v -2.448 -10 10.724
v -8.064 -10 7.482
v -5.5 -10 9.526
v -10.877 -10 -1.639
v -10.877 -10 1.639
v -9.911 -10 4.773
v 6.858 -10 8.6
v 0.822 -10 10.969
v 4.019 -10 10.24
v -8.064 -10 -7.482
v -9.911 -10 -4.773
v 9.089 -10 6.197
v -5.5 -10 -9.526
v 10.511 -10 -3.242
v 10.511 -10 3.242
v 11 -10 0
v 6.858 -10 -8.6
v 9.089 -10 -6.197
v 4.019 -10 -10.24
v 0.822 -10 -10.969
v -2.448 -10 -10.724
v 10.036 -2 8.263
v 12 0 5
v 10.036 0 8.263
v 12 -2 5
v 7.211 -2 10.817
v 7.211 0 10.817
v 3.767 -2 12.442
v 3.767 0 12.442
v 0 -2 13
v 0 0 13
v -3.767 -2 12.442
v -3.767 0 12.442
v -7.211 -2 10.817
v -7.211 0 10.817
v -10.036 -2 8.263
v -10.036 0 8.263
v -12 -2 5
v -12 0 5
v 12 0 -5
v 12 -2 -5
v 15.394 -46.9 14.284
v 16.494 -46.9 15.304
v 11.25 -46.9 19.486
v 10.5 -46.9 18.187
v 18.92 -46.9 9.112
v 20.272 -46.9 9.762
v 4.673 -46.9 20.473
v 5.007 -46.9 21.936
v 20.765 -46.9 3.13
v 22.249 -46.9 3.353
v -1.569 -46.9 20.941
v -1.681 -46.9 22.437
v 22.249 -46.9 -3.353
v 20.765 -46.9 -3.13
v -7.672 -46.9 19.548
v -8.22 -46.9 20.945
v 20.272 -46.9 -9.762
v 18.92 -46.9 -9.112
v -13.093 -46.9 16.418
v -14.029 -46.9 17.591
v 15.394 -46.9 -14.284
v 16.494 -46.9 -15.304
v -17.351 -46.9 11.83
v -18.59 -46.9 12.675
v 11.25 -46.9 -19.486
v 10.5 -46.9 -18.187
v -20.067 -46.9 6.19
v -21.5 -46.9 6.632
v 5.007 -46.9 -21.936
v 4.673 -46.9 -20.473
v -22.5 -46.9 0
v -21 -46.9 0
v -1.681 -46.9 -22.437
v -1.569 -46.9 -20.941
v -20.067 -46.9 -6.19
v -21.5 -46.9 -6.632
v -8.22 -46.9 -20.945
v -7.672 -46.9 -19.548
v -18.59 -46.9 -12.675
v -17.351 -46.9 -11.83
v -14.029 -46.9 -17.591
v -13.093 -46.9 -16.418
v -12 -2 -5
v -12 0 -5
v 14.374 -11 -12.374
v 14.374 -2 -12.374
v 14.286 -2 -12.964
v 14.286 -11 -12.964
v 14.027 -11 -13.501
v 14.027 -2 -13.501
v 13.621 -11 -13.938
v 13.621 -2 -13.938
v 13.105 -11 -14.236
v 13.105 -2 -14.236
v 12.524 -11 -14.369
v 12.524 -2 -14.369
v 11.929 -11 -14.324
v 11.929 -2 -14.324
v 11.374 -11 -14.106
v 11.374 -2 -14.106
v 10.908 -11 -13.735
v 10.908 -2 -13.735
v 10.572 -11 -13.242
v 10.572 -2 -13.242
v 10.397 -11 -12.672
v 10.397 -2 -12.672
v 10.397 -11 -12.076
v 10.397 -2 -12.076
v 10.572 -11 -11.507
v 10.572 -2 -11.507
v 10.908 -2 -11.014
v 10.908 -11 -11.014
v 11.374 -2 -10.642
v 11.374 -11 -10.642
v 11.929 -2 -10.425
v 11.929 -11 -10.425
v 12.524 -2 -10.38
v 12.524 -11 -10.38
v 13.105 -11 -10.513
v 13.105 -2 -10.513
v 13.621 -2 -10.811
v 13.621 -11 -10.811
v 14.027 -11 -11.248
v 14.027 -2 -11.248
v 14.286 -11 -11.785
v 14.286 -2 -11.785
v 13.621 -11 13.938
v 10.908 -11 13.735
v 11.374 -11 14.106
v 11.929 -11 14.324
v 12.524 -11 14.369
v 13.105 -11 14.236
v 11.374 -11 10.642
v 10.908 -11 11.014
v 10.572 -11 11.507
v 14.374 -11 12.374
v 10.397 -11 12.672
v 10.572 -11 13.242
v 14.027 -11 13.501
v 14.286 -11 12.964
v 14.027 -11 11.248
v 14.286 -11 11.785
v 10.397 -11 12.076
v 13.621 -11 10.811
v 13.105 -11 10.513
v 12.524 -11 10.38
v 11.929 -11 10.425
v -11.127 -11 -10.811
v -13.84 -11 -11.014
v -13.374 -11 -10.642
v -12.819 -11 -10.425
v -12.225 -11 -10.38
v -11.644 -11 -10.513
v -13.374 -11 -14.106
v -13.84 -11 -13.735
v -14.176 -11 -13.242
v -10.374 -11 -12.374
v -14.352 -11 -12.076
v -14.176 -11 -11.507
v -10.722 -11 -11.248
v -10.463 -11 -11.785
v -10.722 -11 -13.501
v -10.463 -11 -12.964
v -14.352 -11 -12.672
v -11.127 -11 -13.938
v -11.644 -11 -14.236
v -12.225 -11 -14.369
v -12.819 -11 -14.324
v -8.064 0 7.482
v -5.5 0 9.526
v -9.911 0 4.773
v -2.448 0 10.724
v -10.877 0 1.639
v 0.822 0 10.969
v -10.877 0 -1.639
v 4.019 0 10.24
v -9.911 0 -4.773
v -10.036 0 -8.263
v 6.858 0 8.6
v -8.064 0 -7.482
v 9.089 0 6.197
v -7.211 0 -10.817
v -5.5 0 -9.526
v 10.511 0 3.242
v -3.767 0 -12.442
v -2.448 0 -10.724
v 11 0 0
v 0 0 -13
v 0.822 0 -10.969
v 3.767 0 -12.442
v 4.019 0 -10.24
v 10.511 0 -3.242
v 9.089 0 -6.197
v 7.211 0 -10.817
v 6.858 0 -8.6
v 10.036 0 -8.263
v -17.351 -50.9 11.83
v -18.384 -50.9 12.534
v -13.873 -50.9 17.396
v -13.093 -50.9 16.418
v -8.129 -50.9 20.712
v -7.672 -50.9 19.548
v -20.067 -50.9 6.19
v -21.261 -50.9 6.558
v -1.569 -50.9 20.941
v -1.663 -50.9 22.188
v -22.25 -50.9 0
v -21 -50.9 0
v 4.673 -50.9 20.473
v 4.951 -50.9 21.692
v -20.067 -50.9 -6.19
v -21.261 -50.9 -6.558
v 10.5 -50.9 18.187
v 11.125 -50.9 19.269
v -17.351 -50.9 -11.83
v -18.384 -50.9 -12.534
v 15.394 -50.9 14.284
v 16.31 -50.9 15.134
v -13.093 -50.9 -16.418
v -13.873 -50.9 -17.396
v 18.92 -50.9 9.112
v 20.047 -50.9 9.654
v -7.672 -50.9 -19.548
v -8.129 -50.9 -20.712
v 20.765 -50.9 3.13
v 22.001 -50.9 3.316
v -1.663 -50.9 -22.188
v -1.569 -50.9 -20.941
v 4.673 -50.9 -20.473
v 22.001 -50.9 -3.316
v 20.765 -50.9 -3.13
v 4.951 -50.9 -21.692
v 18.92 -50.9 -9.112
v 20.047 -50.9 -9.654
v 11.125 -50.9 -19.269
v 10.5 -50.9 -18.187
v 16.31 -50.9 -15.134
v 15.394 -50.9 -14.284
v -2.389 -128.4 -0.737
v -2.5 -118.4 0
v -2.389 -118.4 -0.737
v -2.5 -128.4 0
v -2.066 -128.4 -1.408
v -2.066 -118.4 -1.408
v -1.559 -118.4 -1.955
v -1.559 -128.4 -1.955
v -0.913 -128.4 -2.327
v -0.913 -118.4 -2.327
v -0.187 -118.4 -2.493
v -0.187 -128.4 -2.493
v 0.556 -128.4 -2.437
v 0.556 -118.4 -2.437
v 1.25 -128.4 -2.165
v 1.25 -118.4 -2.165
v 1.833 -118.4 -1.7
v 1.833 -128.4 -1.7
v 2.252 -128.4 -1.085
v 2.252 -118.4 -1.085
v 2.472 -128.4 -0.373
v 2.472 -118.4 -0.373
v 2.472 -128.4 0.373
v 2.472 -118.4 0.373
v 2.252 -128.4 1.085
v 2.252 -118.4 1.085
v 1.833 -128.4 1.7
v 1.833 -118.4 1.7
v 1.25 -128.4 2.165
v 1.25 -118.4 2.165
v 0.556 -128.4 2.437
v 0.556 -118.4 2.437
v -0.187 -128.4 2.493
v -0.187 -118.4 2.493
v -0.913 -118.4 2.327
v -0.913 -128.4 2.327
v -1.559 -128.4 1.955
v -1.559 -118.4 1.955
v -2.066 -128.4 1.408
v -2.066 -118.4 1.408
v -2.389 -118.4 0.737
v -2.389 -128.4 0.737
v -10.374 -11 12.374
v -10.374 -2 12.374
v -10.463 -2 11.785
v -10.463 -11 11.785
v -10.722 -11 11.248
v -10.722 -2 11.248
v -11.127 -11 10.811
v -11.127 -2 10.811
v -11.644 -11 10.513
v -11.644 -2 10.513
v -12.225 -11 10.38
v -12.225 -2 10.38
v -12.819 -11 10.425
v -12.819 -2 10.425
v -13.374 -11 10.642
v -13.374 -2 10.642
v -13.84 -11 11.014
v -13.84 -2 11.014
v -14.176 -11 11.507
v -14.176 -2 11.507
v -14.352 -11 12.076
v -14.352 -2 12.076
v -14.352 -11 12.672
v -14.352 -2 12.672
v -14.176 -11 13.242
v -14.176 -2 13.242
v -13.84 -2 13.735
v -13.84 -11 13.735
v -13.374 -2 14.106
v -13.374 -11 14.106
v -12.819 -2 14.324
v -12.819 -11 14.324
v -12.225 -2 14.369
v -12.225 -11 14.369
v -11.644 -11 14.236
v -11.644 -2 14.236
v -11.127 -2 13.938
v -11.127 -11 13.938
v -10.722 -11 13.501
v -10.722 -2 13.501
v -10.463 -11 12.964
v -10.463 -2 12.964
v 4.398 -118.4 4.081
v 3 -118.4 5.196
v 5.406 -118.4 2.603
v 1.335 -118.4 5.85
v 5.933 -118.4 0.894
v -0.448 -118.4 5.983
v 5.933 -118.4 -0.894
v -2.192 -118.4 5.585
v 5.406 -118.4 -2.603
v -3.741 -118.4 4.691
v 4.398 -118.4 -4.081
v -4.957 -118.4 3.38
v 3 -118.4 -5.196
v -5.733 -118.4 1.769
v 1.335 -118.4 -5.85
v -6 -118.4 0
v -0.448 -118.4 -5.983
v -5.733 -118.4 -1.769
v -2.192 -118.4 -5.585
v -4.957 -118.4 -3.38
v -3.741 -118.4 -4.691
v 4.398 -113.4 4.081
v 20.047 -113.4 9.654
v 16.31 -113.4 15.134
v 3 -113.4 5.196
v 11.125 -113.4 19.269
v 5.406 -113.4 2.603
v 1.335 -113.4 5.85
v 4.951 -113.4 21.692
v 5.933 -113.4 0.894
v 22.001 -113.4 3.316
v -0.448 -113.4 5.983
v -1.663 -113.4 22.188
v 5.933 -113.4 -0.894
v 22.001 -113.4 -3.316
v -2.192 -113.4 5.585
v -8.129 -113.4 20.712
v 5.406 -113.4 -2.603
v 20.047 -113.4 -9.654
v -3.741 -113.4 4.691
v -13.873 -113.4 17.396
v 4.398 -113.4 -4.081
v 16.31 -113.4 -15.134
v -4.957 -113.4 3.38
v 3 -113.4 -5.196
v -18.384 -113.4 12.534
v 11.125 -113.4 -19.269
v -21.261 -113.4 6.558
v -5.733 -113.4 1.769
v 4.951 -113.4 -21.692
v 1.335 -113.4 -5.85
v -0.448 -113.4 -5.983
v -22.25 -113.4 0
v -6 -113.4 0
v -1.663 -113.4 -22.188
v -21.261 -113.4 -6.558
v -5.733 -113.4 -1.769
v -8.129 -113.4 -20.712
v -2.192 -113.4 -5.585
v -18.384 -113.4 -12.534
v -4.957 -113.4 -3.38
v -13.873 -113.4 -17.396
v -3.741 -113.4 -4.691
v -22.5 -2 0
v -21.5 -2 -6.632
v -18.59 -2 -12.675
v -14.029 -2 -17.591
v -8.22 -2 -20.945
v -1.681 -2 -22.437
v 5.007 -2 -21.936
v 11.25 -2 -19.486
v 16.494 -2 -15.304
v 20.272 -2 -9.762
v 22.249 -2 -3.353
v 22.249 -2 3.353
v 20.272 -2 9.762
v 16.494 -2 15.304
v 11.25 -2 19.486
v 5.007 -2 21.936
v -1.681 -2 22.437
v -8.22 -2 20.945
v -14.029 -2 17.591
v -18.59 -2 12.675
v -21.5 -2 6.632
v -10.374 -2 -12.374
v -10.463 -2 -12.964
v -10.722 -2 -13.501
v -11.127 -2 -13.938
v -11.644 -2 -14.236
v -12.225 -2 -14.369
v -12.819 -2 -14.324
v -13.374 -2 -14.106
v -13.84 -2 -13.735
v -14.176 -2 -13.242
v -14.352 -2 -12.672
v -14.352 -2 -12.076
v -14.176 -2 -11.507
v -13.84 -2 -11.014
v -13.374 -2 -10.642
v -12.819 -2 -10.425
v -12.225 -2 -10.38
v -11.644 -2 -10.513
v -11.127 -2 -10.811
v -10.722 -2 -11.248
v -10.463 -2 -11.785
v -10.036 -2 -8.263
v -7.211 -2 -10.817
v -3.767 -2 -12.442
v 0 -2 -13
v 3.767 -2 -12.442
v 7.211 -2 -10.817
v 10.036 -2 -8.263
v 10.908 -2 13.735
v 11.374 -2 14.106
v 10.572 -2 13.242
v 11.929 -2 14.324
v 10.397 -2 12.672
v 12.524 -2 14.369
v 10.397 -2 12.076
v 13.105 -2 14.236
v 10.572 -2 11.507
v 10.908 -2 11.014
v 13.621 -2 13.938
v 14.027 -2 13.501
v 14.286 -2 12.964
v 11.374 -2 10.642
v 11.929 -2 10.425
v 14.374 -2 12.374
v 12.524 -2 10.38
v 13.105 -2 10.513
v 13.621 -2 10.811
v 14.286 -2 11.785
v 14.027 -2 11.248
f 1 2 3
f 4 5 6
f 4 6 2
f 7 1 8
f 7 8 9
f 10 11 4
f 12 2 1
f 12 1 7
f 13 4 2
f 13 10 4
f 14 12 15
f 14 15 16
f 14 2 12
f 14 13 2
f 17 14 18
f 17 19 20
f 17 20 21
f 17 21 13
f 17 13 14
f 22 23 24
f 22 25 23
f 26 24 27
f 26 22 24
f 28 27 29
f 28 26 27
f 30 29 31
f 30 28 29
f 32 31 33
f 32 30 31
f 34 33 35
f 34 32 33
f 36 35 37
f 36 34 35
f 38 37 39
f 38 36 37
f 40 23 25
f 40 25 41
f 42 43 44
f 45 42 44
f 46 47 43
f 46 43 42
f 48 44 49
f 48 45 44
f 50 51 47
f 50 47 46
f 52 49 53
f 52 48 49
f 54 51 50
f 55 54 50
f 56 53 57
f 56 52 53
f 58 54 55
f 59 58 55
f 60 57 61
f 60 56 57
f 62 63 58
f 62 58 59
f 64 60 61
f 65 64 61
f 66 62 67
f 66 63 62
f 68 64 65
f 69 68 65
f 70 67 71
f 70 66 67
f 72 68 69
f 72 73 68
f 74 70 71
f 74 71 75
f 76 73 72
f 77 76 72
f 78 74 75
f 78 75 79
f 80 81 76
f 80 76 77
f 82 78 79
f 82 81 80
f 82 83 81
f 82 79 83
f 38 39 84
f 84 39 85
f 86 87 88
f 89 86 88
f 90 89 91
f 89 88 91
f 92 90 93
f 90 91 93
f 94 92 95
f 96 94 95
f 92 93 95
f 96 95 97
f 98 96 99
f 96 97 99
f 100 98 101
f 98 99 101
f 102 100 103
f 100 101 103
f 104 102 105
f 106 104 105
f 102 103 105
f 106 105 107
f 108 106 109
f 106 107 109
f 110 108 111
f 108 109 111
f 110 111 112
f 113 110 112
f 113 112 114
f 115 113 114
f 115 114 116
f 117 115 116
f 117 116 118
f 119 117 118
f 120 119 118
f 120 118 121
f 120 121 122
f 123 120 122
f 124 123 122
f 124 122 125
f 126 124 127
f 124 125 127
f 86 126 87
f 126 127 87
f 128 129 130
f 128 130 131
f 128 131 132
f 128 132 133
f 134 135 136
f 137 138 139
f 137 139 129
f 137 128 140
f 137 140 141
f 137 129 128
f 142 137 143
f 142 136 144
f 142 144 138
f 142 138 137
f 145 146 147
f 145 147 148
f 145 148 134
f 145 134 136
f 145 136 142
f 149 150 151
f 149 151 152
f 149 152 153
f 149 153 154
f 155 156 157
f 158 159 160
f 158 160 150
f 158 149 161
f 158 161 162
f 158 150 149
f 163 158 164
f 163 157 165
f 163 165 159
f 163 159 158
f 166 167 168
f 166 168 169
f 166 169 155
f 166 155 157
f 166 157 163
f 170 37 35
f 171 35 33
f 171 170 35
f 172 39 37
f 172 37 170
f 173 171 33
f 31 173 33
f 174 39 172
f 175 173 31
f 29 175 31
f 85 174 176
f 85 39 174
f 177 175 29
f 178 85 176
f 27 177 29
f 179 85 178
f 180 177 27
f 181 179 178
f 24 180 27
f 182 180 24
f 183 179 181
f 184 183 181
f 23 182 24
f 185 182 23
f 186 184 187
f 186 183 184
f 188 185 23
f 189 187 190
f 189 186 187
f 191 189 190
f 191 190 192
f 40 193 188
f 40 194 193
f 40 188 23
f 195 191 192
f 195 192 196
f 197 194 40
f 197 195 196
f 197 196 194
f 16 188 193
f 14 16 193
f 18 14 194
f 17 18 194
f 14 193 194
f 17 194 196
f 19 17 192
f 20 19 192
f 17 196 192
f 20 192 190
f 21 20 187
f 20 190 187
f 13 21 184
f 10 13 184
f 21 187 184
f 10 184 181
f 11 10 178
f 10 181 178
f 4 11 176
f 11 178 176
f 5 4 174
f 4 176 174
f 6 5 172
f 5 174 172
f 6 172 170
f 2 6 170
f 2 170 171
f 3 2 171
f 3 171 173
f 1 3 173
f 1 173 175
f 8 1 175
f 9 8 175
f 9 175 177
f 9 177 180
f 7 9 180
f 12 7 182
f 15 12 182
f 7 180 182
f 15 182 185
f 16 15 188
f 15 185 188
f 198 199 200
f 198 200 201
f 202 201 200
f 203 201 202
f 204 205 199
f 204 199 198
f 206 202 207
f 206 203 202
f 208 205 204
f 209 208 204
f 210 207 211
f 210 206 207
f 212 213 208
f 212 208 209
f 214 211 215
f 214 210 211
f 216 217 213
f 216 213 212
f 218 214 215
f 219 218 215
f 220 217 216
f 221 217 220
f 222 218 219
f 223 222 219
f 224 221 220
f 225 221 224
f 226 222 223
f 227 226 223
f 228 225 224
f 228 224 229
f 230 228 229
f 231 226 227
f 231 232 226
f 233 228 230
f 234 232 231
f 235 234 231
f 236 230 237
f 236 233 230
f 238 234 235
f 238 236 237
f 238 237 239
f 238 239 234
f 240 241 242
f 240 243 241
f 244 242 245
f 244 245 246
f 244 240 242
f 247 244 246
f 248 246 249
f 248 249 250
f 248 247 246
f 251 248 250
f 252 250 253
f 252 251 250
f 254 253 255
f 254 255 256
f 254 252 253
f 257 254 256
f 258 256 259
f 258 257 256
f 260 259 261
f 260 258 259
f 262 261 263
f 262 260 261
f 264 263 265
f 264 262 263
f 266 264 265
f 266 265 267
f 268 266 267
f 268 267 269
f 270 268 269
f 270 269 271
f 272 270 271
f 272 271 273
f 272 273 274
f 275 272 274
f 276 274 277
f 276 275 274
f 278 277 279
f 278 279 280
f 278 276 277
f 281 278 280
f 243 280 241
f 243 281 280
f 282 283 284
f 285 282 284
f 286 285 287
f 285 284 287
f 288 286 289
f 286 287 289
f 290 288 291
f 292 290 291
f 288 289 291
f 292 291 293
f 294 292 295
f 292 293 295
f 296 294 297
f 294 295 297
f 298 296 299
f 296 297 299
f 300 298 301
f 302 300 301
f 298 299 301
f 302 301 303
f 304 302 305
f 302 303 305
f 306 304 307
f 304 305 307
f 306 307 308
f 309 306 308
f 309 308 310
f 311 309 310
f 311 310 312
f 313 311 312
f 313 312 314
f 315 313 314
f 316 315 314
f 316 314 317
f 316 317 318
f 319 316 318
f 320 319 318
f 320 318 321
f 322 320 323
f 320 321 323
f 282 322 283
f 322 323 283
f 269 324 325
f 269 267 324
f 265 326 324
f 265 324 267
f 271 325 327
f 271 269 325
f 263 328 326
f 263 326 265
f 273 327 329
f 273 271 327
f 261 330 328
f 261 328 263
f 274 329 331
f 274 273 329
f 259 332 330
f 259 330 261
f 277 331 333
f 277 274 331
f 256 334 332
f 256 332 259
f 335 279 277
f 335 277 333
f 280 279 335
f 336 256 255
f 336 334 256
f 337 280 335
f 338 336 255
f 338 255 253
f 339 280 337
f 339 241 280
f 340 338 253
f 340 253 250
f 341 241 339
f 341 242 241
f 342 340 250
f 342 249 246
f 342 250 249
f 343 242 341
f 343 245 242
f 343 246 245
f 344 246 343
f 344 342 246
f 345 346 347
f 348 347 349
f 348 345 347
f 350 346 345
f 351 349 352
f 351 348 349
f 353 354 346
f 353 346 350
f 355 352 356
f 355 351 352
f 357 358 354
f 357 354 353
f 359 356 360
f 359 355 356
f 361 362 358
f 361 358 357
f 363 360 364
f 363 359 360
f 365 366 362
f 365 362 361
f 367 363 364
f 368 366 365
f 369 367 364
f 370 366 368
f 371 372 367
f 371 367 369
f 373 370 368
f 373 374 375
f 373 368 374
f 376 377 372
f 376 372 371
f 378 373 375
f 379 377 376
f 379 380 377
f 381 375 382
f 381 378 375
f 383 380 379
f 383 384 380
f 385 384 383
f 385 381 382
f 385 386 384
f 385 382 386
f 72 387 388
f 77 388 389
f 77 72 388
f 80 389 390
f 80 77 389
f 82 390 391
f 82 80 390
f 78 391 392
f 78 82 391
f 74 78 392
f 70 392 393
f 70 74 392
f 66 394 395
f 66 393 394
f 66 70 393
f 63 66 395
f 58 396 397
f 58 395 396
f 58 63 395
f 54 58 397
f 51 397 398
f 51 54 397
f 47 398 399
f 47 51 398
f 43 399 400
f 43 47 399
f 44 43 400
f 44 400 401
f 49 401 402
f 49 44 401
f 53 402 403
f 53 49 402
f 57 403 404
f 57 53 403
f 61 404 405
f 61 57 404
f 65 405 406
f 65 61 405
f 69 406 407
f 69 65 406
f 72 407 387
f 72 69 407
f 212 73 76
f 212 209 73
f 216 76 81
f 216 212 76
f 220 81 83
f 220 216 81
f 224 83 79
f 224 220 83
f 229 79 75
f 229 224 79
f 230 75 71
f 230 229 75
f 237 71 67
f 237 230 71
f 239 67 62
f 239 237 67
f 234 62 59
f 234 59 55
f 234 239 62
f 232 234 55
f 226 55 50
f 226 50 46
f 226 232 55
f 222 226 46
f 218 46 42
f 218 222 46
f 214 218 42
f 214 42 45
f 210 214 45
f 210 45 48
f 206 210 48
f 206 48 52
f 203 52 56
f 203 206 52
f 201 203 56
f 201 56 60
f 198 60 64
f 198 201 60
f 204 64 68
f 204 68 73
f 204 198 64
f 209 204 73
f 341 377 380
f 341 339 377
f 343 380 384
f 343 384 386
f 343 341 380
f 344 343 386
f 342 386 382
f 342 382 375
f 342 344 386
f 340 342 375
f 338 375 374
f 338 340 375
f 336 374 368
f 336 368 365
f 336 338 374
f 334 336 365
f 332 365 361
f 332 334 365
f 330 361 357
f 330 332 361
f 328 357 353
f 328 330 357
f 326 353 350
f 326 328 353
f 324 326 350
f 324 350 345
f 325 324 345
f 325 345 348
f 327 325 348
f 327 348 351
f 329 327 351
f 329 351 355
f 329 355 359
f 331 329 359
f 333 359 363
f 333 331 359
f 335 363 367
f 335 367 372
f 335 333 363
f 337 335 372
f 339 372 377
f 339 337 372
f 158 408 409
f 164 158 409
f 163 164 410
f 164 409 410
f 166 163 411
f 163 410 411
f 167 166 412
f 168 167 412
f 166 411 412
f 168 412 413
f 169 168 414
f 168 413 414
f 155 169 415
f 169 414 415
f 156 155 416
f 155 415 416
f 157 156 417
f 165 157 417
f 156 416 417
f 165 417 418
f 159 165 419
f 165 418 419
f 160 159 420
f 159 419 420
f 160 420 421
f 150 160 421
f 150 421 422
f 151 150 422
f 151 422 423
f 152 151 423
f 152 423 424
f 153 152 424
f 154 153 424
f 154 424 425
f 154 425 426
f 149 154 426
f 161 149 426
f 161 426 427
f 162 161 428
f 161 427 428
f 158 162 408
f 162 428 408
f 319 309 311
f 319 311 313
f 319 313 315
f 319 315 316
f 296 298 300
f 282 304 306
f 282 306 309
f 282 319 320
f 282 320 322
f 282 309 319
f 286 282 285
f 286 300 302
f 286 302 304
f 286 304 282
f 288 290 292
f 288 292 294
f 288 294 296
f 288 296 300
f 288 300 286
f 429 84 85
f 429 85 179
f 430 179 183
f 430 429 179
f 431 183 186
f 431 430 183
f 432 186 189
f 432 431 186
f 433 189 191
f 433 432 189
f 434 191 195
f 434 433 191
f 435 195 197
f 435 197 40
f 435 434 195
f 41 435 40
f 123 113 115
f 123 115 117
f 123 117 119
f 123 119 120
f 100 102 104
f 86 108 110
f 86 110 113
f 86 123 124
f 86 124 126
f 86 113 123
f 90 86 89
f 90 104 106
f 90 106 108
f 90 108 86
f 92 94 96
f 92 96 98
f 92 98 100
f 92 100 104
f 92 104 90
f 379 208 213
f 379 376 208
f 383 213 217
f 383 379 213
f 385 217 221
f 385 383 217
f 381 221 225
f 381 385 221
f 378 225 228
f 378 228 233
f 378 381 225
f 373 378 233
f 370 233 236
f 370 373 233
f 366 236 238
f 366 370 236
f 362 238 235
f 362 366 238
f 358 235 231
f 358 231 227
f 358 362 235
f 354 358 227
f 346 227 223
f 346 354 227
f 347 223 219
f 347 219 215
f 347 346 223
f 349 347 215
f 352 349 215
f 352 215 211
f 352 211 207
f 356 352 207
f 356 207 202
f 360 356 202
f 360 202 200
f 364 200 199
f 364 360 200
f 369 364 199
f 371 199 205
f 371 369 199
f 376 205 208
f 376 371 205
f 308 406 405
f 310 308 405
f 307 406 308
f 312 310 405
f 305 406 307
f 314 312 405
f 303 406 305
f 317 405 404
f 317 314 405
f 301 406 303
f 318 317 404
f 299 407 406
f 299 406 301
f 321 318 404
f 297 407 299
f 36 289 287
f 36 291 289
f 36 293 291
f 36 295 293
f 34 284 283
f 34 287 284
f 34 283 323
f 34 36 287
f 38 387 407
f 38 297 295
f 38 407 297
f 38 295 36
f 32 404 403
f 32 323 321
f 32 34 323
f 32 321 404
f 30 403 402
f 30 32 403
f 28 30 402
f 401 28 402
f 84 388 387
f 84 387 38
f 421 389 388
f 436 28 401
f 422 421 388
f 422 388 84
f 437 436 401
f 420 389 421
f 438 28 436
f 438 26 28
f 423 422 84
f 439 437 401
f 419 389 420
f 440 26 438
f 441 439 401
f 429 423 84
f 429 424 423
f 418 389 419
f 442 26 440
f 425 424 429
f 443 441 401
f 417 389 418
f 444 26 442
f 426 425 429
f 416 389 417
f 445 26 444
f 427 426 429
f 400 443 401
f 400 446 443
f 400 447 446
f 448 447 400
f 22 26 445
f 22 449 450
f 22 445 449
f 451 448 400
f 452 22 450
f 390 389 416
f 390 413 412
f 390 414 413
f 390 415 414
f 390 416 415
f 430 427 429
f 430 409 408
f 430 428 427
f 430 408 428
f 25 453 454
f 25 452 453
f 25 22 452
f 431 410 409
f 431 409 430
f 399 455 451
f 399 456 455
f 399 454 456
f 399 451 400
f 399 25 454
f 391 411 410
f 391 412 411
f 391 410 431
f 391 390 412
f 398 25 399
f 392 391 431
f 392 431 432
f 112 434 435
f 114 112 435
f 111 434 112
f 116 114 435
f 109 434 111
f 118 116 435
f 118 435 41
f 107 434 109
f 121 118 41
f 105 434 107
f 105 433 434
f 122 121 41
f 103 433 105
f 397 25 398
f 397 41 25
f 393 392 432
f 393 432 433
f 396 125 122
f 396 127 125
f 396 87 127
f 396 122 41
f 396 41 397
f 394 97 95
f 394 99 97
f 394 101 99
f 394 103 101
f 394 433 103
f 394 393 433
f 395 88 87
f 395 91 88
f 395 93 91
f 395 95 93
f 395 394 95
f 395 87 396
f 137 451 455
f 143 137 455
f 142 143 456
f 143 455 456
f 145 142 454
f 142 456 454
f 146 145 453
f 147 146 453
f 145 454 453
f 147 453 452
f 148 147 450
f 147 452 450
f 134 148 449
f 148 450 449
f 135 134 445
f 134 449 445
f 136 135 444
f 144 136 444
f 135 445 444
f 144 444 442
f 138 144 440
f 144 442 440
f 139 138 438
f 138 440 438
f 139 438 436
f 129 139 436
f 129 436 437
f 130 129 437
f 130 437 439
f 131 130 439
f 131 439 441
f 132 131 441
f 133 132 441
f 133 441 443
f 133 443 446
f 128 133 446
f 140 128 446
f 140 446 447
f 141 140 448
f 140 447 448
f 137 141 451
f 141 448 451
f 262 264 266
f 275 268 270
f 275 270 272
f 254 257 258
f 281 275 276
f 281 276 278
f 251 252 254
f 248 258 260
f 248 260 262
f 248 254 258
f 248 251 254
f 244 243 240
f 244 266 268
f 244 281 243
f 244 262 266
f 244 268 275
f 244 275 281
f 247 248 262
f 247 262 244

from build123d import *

# Parameters (mm, degrees)
SKETCH2_R          = 11
CUT_EXTRUDE1_DEPTH = 10
SKETCH3_W          = 5
SKETCH3_H          = 33.574223154
CUT_EXTRUDE2_DEPTH = 2
SKETCH4_R          = 2
CUT_EXTRUDE3_DEPTH = 9


with BuildPart() as part:
    # Sketch1 → Revolve1 (revolve)
    with BuildSketch(Plane.XY):
        Polygon((0, 0), (-13, 0), (-13, -2), (-22.5, -2), (-22.5, -46.9), (-21, -46.9), (-21, -50.9), (-22.25, -50.9), (-22.25, -113.4), (-6, -113.4), (-6, -118.4), (-2.5, -118.4), (-2.5, -128.4), (0, -128.4), align=None)
    revolve(axis=Axis((0, 0, 0), (0, -1, 0)))

    # Sketch2 → Cut-Extrude1 (cut)
    with BuildSketch(Plane(origin=(0, 0, 0), x_dir=(1, 0, 0), z_dir=(0, 1, 0))):
        Circle(SKETCH2_R)
    extrude(amount=-CUT_EXTRUDE1_DEPTH, mode=Mode.SUBTRACT)

    # Sketch3 → Cut-Extrude2 (cut)
    with BuildSketch(Plane(origin=(0, 0, 0), x_dir=(1, 0, 0), z_dir=(0, 1, 0))):
        with Locations((-14.5, 0)):
            Rectangle(SKETCH3_W, SKETCH3_H)
        with Locations((14.5, 0)):
            Rectangle(SKETCH3_W, SKETCH3_H)
    extrude(amount=-CUT_EXTRUDE2_DEPTH, mode=Mode.SUBTRACT)

    # Sketch4 → Cut-Extrude3 (cut)
    with BuildSketch(Plane(origin=(0, -2, 0), x_dir=(1, 0, 0), z_dir=(0, 1, 0))):
        with Locations((-12.374368671, 12.374368671)):
            Circle(SKETCH4_R)
        with Locations((12.374368671, 12.374368671)):
            Circle(SKETCH4_R)
        with Locations((12.374368671, -12.374368671)):
            Circle(SKETCH4_R)
        with Locations((-12.374368671, -12.374368671)):
            Circle(SKETCH4_R)
    extrude(amount=-CUT_EXTRUDE3_DEPTH, mode=Mode.SUBTRACT)


solid = part.part
